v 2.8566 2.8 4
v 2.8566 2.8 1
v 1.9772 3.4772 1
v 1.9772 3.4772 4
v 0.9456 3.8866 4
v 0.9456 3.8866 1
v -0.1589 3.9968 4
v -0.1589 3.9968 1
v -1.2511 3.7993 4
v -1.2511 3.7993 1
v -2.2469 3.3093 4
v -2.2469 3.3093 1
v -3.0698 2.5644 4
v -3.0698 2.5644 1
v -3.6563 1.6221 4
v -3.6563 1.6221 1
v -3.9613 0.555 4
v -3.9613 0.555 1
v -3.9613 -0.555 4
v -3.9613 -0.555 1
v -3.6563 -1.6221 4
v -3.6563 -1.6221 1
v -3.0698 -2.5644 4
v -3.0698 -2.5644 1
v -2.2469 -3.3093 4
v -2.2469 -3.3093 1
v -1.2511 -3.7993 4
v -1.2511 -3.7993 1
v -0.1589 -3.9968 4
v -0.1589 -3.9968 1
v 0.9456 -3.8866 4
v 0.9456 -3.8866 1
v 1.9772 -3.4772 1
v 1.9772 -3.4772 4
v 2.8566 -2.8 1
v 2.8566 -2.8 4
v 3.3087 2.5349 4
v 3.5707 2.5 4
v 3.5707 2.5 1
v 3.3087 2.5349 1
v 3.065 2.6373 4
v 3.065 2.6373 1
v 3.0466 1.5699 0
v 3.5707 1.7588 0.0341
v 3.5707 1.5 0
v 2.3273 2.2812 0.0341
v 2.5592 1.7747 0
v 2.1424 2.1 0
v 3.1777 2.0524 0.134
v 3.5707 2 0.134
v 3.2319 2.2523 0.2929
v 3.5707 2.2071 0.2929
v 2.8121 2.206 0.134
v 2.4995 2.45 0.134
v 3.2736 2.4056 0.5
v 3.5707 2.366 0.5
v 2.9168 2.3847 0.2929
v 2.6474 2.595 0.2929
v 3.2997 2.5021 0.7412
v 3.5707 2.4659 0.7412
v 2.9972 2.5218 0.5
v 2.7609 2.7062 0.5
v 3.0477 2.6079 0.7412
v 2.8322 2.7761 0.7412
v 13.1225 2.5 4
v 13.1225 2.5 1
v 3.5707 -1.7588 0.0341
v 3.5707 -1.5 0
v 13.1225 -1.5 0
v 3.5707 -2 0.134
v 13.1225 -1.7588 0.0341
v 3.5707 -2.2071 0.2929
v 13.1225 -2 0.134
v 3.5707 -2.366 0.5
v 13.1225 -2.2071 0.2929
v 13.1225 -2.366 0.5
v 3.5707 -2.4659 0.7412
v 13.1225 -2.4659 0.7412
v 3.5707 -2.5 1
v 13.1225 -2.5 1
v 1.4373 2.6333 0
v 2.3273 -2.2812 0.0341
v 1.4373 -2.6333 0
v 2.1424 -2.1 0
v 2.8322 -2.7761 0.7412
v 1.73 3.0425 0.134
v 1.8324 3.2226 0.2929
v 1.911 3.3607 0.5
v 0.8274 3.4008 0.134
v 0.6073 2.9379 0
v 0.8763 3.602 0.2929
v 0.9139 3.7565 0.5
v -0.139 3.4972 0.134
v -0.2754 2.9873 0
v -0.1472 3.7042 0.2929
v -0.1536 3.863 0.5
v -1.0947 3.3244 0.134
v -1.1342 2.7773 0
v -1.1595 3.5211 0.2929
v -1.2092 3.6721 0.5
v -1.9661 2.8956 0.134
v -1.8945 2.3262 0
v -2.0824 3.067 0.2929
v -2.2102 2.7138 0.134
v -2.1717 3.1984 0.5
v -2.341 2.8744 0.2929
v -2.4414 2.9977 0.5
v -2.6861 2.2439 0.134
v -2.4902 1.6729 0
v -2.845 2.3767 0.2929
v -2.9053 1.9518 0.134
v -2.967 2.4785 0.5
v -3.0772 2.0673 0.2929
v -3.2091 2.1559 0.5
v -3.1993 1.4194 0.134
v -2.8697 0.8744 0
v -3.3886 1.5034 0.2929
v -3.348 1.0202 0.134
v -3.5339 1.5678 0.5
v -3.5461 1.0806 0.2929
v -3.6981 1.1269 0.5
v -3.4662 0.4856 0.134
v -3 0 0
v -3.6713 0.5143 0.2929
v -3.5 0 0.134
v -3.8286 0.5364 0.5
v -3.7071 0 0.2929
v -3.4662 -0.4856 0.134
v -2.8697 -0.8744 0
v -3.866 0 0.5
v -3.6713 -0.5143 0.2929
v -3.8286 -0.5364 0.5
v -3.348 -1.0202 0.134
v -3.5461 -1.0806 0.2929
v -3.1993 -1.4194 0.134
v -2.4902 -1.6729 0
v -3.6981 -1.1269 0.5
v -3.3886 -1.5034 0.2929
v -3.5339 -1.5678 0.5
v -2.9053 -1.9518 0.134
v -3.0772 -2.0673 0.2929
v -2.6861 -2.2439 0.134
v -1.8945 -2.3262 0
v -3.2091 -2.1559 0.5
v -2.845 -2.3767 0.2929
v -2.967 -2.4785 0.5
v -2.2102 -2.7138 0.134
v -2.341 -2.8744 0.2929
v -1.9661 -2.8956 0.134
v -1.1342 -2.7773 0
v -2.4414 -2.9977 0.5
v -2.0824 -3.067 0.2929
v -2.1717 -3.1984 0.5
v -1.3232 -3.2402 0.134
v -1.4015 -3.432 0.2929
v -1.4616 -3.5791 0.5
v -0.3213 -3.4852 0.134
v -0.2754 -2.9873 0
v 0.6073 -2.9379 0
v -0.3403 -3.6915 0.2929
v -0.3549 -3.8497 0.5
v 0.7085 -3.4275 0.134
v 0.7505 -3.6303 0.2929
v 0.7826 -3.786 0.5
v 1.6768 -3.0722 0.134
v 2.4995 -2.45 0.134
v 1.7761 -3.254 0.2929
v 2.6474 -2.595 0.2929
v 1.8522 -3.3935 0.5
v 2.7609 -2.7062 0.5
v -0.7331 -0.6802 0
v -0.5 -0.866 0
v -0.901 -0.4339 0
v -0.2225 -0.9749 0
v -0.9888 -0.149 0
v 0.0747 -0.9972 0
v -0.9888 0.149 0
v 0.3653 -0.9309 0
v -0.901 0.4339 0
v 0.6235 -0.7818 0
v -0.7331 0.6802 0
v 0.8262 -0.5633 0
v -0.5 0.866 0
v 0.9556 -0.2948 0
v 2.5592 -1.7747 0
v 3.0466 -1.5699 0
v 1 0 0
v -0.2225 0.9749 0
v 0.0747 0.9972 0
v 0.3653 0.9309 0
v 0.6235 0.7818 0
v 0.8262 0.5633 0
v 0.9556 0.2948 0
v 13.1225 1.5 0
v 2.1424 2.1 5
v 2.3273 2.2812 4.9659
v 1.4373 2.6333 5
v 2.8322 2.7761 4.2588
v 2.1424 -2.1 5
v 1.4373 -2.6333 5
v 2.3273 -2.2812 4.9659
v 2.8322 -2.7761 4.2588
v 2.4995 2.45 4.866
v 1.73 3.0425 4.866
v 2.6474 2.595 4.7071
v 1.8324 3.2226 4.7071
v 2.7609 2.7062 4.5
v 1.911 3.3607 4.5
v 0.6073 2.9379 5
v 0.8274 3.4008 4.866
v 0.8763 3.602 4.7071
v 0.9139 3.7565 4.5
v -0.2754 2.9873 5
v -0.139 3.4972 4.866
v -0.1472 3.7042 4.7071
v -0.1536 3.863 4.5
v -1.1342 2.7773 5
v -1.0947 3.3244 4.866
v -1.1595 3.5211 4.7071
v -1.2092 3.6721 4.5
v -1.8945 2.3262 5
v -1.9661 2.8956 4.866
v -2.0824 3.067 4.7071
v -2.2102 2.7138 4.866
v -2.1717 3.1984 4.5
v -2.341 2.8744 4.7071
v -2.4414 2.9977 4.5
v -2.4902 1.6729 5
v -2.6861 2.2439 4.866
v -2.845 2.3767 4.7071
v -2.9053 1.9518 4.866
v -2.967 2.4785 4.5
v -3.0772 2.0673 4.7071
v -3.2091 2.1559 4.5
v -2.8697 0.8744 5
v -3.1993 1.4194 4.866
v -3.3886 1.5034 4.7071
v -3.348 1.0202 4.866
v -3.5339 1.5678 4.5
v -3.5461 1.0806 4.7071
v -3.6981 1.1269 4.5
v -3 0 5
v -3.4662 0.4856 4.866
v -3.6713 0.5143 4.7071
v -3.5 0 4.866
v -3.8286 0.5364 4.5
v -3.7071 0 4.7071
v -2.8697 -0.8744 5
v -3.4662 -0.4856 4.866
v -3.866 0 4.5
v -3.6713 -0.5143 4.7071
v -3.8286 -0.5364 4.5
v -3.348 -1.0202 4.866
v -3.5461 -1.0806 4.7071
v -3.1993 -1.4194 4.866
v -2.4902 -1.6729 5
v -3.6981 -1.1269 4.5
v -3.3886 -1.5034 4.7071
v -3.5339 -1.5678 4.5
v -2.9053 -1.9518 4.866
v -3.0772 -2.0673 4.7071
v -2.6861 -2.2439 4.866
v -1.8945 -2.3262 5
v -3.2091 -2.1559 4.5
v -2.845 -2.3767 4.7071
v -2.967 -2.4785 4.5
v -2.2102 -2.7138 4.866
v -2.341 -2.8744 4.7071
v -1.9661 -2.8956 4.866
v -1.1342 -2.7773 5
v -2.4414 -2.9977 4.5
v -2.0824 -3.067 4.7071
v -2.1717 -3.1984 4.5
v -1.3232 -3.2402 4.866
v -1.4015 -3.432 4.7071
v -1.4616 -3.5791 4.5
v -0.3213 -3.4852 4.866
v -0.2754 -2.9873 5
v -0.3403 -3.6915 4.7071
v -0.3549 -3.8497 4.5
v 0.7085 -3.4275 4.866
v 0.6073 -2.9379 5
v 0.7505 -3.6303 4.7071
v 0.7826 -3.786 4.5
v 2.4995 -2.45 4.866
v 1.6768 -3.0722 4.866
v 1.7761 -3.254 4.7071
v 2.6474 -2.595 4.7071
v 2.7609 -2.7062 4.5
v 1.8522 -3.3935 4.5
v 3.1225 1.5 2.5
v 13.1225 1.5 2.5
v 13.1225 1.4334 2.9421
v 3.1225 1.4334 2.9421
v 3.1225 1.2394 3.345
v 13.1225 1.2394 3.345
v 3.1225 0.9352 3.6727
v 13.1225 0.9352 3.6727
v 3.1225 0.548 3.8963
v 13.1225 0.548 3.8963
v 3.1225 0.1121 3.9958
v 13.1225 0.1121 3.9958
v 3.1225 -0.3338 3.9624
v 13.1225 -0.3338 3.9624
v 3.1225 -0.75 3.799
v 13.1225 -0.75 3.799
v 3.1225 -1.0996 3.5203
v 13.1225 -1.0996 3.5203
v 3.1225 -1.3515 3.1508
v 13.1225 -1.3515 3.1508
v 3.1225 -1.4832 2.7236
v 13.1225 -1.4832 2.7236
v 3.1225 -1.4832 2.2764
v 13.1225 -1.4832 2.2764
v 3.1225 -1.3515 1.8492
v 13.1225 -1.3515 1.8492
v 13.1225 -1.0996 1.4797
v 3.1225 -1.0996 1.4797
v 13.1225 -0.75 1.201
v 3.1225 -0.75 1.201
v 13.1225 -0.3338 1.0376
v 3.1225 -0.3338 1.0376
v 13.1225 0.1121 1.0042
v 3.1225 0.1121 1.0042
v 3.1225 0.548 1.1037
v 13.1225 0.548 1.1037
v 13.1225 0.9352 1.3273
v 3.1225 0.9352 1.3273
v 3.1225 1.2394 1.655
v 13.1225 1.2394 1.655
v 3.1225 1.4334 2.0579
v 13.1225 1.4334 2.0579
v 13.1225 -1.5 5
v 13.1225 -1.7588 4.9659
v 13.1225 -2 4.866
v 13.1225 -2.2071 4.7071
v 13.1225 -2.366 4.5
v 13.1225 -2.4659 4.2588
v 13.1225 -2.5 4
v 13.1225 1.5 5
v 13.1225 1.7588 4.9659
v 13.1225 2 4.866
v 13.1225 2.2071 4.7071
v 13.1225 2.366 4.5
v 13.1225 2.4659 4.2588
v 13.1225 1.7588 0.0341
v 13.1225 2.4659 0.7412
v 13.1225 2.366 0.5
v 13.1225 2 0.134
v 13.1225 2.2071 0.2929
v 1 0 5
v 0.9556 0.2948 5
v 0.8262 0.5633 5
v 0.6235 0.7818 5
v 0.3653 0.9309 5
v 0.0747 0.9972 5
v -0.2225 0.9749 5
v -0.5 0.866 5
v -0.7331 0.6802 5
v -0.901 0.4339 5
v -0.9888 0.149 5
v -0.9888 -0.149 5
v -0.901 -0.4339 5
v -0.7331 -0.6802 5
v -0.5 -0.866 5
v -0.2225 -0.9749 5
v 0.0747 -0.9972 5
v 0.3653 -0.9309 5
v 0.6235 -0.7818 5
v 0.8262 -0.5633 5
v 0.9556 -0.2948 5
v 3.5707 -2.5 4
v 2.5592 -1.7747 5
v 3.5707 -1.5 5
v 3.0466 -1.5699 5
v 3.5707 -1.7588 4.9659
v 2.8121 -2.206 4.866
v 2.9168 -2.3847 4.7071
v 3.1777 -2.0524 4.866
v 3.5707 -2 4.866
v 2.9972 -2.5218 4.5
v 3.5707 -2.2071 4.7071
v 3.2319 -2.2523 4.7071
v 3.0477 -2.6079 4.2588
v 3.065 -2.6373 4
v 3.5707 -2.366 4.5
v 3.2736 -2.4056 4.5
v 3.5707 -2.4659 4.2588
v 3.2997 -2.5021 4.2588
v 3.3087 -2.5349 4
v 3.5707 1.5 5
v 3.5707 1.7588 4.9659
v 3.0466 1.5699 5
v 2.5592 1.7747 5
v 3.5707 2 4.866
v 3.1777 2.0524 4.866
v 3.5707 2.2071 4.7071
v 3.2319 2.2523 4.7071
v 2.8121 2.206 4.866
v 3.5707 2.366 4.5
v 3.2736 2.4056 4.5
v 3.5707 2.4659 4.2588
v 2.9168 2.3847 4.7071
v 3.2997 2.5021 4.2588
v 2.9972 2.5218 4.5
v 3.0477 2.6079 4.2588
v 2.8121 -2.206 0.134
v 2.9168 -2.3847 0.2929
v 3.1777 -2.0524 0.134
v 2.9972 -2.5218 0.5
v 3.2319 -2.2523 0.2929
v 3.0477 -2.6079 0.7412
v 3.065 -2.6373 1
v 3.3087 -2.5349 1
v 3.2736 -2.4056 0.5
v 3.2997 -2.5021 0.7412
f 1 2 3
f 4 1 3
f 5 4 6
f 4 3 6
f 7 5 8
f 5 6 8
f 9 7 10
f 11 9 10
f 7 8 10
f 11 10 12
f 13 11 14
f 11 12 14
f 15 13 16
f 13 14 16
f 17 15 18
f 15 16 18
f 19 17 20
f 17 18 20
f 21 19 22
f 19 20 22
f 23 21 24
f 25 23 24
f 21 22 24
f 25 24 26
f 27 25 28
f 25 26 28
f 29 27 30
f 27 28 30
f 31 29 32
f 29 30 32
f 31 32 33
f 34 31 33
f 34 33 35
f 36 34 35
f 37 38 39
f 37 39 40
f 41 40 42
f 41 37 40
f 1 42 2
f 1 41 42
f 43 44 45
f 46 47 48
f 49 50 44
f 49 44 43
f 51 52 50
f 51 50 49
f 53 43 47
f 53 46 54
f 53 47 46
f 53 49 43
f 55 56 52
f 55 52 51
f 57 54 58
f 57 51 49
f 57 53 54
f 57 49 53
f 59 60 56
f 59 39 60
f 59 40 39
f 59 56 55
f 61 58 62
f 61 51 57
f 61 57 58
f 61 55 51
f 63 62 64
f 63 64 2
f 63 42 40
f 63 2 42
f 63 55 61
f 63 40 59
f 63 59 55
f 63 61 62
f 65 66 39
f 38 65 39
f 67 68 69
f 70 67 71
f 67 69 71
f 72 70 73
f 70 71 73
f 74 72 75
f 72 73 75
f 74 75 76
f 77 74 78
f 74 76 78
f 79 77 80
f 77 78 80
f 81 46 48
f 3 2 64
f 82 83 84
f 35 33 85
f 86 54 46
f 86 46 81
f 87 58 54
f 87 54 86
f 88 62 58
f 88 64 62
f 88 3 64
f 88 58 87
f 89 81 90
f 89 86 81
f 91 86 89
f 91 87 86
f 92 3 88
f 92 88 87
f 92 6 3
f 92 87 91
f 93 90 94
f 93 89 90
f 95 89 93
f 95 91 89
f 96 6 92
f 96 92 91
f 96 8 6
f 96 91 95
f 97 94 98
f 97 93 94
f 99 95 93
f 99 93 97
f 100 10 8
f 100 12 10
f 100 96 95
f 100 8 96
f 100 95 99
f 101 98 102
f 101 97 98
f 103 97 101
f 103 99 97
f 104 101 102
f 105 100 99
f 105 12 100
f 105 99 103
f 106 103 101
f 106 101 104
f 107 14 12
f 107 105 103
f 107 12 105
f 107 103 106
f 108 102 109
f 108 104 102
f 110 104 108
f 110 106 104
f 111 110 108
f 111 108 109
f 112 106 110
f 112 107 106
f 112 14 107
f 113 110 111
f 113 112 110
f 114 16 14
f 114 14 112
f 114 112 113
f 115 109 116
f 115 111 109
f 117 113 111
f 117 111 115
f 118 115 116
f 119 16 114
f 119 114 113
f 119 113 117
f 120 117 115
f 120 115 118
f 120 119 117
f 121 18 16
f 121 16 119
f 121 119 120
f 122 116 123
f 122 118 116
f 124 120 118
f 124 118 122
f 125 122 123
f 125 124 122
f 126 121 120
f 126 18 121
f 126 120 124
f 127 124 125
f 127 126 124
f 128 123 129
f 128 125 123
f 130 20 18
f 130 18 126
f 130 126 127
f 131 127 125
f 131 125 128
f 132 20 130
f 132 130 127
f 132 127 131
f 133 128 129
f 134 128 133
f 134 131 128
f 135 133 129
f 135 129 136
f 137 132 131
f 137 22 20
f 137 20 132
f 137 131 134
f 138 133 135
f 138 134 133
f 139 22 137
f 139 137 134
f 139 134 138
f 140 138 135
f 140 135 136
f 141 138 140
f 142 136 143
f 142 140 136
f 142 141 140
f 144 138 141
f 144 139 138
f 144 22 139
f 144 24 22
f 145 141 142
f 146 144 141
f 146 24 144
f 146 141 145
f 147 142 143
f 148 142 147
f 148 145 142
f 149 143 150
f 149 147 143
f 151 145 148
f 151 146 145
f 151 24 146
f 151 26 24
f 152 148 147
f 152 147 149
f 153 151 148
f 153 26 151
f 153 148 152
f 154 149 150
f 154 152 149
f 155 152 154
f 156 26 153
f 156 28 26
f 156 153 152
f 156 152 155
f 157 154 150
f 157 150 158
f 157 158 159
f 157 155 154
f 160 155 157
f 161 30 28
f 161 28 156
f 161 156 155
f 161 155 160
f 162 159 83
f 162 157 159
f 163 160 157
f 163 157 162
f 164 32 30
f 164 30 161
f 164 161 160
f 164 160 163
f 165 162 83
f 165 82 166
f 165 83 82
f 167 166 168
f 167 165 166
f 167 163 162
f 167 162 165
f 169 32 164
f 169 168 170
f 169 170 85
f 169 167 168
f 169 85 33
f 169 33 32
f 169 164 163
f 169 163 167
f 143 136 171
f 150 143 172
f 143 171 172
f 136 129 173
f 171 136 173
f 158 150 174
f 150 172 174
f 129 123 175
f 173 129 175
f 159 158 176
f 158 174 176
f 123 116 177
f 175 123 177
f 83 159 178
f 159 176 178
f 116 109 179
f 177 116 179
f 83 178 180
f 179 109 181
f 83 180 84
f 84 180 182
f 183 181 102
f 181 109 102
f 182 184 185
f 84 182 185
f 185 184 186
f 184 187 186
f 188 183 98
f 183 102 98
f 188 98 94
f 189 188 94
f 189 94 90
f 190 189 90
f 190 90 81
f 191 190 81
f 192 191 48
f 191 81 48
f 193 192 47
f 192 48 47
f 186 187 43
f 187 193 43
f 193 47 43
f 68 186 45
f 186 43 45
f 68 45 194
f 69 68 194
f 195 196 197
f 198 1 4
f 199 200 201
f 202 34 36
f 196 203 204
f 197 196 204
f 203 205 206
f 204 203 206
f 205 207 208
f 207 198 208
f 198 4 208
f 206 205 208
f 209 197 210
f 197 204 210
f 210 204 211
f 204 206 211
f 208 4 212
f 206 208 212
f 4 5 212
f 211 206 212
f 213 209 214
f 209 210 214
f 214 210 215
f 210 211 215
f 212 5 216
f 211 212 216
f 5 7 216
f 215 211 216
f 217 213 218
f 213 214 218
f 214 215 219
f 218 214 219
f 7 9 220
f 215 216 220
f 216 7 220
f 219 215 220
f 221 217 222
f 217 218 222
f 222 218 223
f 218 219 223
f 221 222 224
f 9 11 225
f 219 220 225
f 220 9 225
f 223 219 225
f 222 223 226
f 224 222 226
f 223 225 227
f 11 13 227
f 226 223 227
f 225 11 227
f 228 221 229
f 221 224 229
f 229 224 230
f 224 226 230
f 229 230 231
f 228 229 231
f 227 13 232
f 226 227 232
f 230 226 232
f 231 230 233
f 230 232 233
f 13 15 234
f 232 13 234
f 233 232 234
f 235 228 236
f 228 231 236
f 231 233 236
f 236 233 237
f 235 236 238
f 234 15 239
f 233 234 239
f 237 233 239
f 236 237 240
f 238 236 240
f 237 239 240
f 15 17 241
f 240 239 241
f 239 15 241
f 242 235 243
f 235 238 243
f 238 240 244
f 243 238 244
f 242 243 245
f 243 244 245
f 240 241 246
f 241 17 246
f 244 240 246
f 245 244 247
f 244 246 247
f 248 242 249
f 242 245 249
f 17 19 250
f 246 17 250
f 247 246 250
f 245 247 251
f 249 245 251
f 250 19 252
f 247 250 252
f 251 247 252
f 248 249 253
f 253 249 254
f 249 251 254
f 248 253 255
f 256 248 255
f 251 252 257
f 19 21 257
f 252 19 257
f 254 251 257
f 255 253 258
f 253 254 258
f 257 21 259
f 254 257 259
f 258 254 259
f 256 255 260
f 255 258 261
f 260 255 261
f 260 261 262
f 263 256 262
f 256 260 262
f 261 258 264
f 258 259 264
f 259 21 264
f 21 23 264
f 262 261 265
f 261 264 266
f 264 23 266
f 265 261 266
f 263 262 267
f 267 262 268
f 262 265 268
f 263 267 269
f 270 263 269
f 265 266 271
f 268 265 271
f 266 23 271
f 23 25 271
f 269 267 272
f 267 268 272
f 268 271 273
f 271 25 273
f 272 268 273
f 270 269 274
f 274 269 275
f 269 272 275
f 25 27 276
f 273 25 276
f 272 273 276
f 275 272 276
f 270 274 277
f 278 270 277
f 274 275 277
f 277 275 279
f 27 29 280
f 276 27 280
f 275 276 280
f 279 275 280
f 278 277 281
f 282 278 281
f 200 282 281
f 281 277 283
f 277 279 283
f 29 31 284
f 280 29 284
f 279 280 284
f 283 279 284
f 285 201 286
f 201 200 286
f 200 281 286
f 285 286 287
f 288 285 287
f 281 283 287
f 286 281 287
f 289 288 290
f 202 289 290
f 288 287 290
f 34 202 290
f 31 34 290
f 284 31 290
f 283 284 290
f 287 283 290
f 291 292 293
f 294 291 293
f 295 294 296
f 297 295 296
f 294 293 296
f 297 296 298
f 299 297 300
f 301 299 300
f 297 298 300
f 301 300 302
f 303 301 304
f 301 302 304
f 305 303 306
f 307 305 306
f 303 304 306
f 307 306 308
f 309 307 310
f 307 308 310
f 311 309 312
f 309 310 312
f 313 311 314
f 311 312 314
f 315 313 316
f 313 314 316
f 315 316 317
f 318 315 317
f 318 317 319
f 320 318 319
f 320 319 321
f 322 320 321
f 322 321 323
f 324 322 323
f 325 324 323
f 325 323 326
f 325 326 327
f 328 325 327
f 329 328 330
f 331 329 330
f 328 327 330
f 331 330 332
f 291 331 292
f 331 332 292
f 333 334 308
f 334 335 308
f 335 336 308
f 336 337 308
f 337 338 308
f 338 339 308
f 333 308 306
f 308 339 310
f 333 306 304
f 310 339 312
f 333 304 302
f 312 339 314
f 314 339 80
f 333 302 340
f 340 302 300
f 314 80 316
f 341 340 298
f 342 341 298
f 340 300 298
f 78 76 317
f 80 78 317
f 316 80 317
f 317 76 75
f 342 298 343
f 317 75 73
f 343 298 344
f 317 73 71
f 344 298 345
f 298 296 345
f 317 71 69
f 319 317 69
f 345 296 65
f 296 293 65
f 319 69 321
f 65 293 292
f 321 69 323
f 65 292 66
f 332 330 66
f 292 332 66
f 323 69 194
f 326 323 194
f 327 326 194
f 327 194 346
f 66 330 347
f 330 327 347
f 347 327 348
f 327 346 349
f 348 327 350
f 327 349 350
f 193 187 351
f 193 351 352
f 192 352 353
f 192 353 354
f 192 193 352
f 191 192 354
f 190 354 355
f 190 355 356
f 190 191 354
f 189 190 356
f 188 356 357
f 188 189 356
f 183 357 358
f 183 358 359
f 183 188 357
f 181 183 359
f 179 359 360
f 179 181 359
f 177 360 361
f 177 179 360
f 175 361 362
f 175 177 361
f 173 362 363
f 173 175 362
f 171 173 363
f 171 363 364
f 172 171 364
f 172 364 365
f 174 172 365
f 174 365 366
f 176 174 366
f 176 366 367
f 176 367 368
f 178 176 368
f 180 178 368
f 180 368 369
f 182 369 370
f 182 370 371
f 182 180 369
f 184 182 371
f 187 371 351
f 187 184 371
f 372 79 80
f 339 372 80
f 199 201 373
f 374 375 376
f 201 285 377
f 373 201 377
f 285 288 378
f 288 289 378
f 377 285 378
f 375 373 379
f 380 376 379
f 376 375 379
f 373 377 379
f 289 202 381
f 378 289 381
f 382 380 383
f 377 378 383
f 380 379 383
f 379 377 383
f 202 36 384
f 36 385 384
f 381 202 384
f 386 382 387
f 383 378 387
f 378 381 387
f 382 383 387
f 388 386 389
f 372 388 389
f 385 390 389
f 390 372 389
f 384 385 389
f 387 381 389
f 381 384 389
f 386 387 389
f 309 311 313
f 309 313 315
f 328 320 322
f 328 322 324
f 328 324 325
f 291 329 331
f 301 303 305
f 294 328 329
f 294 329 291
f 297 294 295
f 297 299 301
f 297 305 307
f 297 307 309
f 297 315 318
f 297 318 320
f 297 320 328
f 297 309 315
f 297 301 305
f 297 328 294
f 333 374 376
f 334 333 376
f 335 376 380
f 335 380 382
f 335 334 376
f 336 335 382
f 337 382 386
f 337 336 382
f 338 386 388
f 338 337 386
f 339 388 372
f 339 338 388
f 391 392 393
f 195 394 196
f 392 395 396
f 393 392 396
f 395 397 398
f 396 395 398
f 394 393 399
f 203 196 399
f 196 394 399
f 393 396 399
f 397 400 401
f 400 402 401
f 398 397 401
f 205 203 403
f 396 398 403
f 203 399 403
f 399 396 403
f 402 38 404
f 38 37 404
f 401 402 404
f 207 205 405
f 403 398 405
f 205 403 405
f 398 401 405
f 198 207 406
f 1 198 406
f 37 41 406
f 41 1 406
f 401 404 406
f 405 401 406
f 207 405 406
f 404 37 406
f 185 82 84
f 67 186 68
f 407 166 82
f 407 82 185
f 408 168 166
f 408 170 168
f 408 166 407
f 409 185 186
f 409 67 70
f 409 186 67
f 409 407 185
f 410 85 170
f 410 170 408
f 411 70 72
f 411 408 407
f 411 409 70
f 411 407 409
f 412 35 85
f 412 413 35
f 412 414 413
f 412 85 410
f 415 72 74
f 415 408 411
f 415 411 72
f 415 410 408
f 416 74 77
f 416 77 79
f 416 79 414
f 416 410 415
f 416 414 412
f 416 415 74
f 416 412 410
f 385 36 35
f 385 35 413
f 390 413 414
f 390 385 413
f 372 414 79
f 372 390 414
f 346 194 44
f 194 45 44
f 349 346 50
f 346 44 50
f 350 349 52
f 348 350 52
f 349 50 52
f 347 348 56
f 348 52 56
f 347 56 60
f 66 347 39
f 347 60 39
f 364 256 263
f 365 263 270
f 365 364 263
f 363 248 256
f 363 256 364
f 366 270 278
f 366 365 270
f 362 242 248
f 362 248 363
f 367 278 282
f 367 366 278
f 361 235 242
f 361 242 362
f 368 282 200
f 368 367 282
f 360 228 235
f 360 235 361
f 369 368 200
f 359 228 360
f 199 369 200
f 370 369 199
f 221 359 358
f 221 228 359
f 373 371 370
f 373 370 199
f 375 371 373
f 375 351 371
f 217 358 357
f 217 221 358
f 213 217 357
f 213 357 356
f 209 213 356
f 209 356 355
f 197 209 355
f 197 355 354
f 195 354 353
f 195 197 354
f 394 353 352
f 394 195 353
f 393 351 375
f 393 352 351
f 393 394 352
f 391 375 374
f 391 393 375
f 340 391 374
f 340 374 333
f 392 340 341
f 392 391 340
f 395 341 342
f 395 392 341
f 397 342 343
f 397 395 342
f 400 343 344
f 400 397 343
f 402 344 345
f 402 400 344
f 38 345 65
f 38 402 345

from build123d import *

# Parameters (mm, degrees)
F0_R     = 1
F1_DEPTH = 5
F2_R     = 1.5
F3_DEPTH = 10
F4_F1_R  = 1
F4_F2_R  = 1


with BuildPart() as f1:
    # F0 (on Top) → F1 (new body)
    with BuildSketch(Plane.XY):
        with BuildLine():
            Line((13.1224989992, 2.5), (3.1224989992, 2.5))
            ThreePointArc((3.1224989992, 2.5), (-4, 0), (3.1224989992, -2.5))
            Line((3.1224989992, -2.5), (13.1224989992, -2.5))
            Line((13.1224989992, -2.5), (13.1224989992, 2.5))
        make_face()
        Circle(F0_R, mode=Mode.SUBTRACT)
    extrude(amount=F1_DEPTH)

    # F2 (on face) → F3 (cut)
    with BuildSketch(Plane.YZ.offset(13.1224989992)):
        with Locations((0, 2.5)):
            Circle(F2_R)
    extrude(amount=-F3_DEPTH, mode=Mode.SUBTRACT)

    # F4: fillet of radius 1 on 4 edges, made by hand

    # F4_f1
    f4_f1_edges = [f1.edges().sort_by_distance(p)[0] for p in [
        (3.1224989992, 2.5, 2.5),
        (3.1224989992, -2.5, 2.5),
    ]]
    fillet(f4_f1_edges, radius=F4_F1_R)

    # F4_f2
    f4_f2_edges = [f1.edges().sort_by_distance(p)[0] for p in [
        (8.3466066067, -2.5, 5),
        (8.3466066067, -2.5, 0),
        (3.1834158797, -2.5780455543, 0),
        (3.1834158797, -2.5780455543, 5),
    ]]
    fillet(f4_f2_edges, radius=F4_F2_R)


solid = f1.part
